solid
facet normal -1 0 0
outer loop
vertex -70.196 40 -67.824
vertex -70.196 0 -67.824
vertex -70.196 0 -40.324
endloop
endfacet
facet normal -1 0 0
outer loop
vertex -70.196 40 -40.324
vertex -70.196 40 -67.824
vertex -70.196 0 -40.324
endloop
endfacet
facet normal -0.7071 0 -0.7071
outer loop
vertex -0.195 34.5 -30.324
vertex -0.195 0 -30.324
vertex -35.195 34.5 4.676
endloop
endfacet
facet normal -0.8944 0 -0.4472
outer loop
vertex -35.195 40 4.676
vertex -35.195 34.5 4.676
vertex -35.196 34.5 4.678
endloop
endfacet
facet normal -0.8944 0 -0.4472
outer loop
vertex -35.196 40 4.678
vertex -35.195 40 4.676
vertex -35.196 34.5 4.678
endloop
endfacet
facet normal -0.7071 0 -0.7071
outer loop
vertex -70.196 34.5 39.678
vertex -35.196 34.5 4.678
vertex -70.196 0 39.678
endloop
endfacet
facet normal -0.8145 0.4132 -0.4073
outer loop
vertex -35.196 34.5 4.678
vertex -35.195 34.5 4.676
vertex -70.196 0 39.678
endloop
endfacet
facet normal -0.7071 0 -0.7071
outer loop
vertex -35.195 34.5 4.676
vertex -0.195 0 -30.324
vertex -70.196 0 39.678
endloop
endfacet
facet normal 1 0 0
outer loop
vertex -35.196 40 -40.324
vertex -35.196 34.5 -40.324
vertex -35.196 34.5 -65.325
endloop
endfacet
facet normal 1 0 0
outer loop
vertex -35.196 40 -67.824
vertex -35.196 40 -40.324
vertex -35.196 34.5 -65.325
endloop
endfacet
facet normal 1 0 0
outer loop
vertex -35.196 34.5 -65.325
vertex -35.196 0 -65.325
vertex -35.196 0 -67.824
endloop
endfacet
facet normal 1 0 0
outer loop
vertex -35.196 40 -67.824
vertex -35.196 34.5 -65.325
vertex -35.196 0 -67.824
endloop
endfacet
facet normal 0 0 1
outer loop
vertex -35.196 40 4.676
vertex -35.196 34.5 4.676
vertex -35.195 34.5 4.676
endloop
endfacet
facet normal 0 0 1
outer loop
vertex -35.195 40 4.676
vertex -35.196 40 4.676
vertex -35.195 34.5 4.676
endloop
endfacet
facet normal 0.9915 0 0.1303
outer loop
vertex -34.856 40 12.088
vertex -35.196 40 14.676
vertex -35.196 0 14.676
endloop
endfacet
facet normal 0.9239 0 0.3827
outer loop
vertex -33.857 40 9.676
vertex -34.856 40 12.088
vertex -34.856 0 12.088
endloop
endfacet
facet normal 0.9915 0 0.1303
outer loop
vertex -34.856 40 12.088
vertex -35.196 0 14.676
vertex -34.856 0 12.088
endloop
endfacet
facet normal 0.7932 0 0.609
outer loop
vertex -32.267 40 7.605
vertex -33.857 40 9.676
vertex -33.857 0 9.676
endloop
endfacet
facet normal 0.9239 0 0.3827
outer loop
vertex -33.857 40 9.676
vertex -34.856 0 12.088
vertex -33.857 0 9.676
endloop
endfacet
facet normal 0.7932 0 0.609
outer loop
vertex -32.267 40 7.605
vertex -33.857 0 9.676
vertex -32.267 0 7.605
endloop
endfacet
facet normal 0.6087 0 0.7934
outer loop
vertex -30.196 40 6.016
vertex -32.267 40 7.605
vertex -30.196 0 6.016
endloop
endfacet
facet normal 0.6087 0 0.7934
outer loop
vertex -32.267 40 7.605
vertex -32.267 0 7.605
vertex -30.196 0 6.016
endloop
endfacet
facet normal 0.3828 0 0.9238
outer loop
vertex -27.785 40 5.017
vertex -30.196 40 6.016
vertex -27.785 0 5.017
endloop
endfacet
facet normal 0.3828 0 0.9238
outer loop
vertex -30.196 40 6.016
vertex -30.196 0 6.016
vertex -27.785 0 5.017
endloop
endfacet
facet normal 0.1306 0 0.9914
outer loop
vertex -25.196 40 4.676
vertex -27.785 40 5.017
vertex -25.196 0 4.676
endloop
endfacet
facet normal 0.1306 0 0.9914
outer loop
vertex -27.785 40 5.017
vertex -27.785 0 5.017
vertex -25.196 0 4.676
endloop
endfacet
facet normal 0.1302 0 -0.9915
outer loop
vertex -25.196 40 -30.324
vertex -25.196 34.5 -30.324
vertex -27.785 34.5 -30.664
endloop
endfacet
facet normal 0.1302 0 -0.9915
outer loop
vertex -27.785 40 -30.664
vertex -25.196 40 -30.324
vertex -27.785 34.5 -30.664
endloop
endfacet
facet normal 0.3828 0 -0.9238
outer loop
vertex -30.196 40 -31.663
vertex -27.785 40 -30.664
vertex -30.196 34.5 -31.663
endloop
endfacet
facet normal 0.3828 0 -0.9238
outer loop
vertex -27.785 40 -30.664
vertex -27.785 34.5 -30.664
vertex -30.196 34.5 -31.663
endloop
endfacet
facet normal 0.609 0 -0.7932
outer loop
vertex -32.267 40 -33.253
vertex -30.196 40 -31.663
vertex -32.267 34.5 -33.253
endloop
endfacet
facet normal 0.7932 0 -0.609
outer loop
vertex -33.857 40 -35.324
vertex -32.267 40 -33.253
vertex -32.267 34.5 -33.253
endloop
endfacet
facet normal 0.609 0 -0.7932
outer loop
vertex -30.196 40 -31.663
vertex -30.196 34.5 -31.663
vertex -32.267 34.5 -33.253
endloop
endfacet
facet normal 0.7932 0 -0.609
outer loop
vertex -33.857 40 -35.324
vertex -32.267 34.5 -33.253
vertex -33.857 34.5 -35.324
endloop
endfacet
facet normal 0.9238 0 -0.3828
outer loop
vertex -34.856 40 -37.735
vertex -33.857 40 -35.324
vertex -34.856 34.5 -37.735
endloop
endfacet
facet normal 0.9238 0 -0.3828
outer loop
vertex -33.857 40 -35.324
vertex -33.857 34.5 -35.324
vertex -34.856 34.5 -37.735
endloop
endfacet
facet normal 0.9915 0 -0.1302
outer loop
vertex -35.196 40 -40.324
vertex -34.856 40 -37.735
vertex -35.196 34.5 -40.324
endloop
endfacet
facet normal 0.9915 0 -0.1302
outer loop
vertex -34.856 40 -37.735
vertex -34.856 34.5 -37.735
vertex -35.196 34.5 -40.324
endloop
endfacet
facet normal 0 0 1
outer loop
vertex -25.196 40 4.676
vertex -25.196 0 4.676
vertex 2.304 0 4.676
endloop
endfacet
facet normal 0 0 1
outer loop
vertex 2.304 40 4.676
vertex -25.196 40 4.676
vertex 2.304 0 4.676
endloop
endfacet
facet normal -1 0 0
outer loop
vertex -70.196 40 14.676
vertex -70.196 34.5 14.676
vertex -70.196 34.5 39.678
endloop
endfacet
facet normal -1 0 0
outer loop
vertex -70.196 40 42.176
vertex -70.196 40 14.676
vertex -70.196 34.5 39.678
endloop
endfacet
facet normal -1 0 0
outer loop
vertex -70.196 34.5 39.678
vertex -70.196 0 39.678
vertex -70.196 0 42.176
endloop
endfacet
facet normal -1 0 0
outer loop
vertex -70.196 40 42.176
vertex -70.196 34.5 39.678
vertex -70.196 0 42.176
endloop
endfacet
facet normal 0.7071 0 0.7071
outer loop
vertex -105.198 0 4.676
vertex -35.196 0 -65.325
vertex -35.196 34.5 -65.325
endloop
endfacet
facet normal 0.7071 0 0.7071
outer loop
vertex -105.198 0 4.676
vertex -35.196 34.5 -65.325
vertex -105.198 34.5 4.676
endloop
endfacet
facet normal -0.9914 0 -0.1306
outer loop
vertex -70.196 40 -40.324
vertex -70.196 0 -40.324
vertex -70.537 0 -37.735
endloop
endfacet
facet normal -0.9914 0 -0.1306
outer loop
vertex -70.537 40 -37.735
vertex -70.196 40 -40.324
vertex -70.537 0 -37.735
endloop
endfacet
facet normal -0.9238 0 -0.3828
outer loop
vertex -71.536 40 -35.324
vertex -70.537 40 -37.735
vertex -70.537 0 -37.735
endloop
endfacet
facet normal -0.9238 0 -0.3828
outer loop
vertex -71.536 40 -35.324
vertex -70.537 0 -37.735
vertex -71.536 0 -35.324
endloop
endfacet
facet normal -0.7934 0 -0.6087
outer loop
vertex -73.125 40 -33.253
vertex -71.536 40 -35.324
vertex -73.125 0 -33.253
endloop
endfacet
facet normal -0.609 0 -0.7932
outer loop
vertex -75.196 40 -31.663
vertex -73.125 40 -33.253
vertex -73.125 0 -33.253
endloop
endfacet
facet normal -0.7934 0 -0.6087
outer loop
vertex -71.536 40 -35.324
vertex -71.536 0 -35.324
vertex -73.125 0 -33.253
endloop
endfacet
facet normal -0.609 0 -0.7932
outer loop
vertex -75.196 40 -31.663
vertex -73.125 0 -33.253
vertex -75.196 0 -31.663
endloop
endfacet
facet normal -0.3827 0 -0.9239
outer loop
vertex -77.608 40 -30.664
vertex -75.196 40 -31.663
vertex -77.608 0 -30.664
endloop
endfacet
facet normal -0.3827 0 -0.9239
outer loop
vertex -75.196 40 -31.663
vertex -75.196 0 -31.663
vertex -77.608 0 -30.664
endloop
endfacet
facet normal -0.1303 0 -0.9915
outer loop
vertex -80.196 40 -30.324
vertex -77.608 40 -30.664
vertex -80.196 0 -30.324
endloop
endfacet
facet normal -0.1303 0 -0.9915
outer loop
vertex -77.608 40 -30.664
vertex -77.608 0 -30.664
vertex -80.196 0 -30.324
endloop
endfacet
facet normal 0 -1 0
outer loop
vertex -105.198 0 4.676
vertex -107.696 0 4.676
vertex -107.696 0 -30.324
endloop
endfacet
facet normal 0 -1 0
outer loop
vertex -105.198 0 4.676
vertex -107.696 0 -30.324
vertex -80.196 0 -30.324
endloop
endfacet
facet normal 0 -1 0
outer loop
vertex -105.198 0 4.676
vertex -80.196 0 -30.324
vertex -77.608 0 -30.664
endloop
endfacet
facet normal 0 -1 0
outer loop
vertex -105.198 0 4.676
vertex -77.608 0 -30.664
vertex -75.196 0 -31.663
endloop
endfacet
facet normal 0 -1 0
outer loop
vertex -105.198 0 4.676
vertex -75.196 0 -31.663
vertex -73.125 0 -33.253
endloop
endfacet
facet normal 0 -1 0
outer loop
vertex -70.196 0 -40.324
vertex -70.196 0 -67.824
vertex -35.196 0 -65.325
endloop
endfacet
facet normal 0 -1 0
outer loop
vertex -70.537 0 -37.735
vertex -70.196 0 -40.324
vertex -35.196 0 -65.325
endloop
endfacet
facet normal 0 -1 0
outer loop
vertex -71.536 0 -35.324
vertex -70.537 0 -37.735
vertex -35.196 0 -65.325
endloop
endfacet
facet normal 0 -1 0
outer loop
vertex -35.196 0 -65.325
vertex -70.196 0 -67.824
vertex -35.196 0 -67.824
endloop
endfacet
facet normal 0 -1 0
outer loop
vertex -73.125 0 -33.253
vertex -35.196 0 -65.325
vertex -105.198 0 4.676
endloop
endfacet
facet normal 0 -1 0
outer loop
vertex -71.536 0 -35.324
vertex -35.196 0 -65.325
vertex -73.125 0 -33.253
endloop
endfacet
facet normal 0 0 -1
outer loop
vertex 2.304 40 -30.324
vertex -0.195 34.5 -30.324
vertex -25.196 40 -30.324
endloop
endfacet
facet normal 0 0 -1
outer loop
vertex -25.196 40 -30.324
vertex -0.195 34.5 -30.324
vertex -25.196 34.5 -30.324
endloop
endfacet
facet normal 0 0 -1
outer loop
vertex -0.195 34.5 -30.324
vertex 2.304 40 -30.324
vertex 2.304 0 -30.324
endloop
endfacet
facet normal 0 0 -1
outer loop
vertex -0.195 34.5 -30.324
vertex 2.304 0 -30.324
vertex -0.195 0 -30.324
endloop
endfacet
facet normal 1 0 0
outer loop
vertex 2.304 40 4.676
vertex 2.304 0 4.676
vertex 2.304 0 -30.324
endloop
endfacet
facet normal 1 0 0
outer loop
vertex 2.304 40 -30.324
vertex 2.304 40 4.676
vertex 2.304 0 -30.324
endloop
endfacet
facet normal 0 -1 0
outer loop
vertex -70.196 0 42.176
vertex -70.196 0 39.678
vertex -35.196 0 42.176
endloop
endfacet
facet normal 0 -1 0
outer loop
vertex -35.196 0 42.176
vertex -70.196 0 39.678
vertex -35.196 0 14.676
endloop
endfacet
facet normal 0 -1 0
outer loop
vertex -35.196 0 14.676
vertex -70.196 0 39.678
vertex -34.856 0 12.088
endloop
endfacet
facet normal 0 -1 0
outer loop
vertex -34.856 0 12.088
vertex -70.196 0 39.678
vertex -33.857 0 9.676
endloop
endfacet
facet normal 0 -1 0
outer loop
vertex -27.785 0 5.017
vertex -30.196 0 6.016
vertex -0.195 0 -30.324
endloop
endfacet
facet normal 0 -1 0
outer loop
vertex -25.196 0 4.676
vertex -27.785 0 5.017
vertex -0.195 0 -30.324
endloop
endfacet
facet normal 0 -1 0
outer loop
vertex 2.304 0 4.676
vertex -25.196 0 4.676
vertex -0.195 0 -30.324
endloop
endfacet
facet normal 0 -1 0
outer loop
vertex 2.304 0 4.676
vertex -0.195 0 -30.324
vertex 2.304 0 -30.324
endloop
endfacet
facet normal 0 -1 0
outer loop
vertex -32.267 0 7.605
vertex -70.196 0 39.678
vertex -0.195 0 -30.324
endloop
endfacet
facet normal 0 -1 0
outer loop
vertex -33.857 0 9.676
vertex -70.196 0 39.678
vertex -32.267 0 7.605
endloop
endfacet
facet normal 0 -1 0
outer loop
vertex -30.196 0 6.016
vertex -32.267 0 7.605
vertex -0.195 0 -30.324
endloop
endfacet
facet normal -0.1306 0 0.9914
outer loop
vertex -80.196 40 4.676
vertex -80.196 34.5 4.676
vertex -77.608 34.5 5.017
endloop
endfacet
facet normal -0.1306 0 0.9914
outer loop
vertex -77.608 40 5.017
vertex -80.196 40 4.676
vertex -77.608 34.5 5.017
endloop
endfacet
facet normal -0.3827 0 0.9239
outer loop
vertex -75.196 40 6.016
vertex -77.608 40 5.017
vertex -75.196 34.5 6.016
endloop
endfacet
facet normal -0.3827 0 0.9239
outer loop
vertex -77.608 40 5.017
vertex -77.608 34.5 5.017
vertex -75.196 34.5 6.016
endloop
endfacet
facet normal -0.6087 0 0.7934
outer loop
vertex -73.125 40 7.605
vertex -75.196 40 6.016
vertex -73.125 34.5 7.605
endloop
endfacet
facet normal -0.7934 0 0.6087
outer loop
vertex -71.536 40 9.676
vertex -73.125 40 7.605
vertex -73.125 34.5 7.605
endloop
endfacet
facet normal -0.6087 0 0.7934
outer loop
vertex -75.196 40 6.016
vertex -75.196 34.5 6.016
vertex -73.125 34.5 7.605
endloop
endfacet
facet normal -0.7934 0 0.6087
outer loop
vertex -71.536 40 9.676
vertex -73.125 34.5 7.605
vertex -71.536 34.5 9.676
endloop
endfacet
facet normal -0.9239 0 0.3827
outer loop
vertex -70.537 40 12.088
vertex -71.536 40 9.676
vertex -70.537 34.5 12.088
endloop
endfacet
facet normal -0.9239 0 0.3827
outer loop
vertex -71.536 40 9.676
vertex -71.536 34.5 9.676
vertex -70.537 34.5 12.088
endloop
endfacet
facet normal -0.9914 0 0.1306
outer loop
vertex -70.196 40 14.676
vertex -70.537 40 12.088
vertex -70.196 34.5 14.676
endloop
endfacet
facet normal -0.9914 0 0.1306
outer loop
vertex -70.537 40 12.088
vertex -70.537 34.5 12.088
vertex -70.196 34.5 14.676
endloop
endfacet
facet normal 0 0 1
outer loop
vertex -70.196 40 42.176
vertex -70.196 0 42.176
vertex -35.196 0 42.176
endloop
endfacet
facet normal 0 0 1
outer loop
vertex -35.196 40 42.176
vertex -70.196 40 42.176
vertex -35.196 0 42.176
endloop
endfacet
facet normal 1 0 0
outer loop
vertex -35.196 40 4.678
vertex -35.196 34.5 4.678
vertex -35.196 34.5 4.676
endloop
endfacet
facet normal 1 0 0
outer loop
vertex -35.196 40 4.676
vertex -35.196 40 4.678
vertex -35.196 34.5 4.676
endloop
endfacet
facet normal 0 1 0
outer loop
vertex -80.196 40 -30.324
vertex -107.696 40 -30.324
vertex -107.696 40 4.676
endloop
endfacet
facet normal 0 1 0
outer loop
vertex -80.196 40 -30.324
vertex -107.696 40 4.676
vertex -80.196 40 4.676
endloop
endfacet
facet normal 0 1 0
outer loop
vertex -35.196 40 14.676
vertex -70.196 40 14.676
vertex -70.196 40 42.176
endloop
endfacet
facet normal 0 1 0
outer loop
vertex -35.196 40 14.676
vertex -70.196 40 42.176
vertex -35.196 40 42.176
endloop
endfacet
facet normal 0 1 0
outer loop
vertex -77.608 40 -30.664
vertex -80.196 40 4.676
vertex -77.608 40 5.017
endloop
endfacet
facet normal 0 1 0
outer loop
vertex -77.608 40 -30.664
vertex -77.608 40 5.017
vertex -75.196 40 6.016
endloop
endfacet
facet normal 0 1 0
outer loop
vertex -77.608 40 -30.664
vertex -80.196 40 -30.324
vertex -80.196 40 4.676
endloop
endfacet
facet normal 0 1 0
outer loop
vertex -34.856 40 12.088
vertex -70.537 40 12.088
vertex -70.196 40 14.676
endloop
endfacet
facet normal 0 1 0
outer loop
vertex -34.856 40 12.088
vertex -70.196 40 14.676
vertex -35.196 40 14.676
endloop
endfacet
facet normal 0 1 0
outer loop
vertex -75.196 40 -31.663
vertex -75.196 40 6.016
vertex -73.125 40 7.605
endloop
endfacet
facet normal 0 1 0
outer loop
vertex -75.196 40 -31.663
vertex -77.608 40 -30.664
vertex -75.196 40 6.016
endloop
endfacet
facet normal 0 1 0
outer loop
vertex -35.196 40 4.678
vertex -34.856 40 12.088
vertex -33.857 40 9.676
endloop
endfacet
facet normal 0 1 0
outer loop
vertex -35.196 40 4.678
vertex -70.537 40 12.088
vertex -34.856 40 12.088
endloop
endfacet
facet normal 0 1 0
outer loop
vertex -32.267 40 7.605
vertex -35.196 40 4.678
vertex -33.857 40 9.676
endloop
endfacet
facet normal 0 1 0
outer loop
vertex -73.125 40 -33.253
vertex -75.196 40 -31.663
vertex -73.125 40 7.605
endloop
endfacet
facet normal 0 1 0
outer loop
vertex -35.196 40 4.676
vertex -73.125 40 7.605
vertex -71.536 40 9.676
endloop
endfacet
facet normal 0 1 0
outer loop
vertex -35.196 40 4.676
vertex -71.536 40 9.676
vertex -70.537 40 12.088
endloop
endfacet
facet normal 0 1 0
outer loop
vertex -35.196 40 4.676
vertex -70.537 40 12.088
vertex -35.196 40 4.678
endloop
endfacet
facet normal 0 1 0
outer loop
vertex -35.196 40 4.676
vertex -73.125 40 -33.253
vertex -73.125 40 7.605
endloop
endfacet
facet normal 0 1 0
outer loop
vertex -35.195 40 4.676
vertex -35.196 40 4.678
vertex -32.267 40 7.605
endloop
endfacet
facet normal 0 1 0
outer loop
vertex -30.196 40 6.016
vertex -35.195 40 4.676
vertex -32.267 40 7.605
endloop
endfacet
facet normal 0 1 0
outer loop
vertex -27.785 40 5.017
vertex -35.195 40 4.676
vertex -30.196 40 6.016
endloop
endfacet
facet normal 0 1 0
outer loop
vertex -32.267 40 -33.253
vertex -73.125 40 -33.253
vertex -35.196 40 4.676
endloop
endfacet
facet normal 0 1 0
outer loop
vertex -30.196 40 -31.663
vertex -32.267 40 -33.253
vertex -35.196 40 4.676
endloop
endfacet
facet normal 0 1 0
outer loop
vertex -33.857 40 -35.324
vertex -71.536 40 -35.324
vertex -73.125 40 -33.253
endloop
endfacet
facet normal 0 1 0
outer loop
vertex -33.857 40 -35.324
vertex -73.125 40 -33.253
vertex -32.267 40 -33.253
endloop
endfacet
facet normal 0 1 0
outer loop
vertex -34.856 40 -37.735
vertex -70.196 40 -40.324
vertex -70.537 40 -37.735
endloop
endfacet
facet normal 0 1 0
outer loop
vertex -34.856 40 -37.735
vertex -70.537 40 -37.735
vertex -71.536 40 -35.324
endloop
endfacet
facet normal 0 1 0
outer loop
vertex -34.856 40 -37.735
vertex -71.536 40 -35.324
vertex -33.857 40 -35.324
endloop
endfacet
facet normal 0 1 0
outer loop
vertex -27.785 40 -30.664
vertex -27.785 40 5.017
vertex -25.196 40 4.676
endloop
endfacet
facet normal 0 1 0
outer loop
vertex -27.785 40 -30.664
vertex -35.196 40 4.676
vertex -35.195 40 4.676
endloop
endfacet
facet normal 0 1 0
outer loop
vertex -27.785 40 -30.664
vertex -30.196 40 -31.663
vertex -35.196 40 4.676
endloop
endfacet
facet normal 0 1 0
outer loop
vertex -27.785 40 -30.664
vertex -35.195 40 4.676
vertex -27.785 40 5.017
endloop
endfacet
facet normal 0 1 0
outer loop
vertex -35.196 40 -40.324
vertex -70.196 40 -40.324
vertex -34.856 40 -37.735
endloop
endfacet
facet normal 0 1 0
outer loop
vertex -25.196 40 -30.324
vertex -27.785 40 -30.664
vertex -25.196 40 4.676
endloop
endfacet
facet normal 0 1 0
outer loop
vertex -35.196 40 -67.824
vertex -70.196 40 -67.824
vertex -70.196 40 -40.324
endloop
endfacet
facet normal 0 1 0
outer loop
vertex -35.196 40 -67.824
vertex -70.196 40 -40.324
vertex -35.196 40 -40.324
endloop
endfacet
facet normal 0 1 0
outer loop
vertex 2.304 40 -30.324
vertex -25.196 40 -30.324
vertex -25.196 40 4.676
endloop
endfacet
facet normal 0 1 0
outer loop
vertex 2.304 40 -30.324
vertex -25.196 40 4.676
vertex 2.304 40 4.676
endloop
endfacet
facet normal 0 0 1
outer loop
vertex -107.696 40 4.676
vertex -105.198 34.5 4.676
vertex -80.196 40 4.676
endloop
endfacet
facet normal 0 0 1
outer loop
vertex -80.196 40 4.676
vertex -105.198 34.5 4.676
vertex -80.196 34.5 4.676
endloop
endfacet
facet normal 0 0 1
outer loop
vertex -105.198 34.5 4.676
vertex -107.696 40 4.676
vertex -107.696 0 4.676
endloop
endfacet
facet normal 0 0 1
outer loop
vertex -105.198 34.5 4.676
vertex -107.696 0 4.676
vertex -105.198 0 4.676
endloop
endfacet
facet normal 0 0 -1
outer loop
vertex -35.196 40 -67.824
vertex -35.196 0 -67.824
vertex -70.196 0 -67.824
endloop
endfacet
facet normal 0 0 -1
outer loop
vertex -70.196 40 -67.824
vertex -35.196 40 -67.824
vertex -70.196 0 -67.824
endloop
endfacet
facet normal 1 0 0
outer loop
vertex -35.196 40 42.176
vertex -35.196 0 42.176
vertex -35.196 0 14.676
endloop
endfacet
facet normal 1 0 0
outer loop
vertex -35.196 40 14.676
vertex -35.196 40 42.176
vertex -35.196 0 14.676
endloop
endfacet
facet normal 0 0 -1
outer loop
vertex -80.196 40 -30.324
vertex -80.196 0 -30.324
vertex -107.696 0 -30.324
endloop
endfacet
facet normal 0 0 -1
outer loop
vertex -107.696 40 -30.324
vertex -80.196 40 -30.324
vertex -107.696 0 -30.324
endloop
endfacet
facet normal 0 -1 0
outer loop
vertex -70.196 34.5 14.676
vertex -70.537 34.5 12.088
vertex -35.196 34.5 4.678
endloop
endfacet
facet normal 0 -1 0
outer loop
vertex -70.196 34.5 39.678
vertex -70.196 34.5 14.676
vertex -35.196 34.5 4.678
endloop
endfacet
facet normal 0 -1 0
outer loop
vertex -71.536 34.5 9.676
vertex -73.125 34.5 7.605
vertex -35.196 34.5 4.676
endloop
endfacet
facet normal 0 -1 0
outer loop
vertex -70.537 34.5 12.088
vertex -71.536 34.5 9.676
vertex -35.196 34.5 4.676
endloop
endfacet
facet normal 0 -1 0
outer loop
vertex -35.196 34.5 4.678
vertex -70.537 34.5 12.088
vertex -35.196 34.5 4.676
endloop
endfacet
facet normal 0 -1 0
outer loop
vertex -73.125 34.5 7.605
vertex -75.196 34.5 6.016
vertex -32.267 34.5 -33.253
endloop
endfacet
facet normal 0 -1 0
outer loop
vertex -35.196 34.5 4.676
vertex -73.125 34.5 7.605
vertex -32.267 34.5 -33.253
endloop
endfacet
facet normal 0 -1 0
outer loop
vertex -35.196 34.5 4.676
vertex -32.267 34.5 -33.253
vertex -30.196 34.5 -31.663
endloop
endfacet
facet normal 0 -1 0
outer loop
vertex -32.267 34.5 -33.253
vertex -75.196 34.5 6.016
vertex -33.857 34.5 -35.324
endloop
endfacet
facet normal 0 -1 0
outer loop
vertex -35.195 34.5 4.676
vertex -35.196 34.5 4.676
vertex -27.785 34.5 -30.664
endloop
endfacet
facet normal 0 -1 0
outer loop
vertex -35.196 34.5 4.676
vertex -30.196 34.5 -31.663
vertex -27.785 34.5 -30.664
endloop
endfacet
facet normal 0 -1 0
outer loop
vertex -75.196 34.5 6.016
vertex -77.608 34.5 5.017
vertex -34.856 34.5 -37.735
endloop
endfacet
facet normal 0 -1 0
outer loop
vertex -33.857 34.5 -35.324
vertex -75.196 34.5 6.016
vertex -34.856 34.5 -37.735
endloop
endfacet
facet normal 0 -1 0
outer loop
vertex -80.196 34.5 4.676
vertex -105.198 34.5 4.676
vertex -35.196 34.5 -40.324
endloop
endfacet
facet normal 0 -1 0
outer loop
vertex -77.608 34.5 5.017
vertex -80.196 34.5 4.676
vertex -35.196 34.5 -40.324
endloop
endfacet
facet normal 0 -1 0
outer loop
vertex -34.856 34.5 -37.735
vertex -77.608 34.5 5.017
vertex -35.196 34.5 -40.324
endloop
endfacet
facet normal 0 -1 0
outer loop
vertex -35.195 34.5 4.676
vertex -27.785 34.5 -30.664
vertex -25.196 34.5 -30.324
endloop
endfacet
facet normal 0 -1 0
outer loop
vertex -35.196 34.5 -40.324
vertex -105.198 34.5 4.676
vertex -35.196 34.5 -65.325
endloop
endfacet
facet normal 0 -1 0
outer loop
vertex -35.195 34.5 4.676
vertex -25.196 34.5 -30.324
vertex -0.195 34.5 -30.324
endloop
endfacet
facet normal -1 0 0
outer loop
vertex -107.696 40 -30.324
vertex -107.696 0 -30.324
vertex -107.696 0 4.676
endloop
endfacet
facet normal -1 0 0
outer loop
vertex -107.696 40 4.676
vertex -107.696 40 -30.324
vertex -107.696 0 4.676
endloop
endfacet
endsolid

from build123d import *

# Parameters (mm, degrees)
BOSS_EXTRUDE6_DEPTH = 40
CUT_EXTRUDE2_DEPTH  = 34.5


with BuildPart() as part:
    # Sketch1 → Boss-Extrude6 (new body)
    with BuildSketch(Plane(origin=(0, 0, 0), x_dir=(1, 0, 0), z_dir=(0, 1, 0))):
        with BuildLine():
            Line((-35.196356555, 67.823627432), (-70.196356555, 67.823627432))
            Line((-70.196356555, 67.823627432), (-70.196356555, 40.323627432))
            ThreePointArc((-70.196356555, 40.323627432), (-73.125288743, 33.25255962), (-80.196356555, 30.323627432))
            Line((-80.196356555, 30.323627432), (-107.696356555, 30.323627432))
            Line((-107.696356555, 30.323627432), (-107.696356555, -4.676372568))
            Line((-107.696356555, -4.676372568), (-80.196356555, -4.676372568))
            ThreePointArc((-80.196356555, -4.676372568), (-73.125288743, -7.605304756), (-70.196356555, -14.676372568))
            Line((-70.196356555, -14.676372568), (-70.196356555, -42.176372568))
            Line((-70.196356555, -42.176372568), (-35.196356555, -42.176372568))
            Line((-35.196356555, -42.176372568), (-35.196356555, -14.676372568))
            ThreePointArc((-35.196356555, -14.676372568), (-32.267424367, -7.605304756), (-25.196356555, -4.676372568))
            Line((-25.196356555, -4.676372568), (2.303643445, -4.676372568))
            Line((2.303643445, -4.676372568), (2.303643445, 30.323627432))
            Line((2.303643445, 30.323627432), (-25.196356555, 30.323627432))
            ThreePointArc((-25.196356555, 30.323627432), (-32.267424367, 33.25255962), (-35.196356555, 40.323627432))
            Line((-35.196356555, 40.323627432), (-35.196356555, 67.823627432))
        make_face()
        Polygon((-35.196356555, -4.676372568), (-35.194570886, -4.676372568), (-35.196356555, -4.678158237), align=None, mode=Mode.SUBTRACT)
    extrude(amount=BOSS_EXTRUDE6_DEPTH)

    # Sketch1<9> → Cut-Extrude2 (cut)
    with BuildSketch(Plane(origin=(0, 0, 0), x_dir=(1, 0, 0), z_dir=(0, 1, 0))):
        Polygon((-35.196356555, 50.831509755), (-35.196356555, 65.325413101), (-70.196356555, 30.325413101), (-105.198142224, -4.676372568), (-90.704238878, -4.676372568), (-70.196356555, -25.184254891), (-70.196356555, -39.678158237), (-35.196356555, -4.678158237), (-35.196356555, -4.676372568), (-35.194570886, -4.676372568), (-0.194570886, 30.323627432), (-14.688474232, 30.323627432), align=None)
    extrude(amount=CUT_EXTRUDE2_DEPTH, mode=Mode.SUBTRACT)


solid = part.part
